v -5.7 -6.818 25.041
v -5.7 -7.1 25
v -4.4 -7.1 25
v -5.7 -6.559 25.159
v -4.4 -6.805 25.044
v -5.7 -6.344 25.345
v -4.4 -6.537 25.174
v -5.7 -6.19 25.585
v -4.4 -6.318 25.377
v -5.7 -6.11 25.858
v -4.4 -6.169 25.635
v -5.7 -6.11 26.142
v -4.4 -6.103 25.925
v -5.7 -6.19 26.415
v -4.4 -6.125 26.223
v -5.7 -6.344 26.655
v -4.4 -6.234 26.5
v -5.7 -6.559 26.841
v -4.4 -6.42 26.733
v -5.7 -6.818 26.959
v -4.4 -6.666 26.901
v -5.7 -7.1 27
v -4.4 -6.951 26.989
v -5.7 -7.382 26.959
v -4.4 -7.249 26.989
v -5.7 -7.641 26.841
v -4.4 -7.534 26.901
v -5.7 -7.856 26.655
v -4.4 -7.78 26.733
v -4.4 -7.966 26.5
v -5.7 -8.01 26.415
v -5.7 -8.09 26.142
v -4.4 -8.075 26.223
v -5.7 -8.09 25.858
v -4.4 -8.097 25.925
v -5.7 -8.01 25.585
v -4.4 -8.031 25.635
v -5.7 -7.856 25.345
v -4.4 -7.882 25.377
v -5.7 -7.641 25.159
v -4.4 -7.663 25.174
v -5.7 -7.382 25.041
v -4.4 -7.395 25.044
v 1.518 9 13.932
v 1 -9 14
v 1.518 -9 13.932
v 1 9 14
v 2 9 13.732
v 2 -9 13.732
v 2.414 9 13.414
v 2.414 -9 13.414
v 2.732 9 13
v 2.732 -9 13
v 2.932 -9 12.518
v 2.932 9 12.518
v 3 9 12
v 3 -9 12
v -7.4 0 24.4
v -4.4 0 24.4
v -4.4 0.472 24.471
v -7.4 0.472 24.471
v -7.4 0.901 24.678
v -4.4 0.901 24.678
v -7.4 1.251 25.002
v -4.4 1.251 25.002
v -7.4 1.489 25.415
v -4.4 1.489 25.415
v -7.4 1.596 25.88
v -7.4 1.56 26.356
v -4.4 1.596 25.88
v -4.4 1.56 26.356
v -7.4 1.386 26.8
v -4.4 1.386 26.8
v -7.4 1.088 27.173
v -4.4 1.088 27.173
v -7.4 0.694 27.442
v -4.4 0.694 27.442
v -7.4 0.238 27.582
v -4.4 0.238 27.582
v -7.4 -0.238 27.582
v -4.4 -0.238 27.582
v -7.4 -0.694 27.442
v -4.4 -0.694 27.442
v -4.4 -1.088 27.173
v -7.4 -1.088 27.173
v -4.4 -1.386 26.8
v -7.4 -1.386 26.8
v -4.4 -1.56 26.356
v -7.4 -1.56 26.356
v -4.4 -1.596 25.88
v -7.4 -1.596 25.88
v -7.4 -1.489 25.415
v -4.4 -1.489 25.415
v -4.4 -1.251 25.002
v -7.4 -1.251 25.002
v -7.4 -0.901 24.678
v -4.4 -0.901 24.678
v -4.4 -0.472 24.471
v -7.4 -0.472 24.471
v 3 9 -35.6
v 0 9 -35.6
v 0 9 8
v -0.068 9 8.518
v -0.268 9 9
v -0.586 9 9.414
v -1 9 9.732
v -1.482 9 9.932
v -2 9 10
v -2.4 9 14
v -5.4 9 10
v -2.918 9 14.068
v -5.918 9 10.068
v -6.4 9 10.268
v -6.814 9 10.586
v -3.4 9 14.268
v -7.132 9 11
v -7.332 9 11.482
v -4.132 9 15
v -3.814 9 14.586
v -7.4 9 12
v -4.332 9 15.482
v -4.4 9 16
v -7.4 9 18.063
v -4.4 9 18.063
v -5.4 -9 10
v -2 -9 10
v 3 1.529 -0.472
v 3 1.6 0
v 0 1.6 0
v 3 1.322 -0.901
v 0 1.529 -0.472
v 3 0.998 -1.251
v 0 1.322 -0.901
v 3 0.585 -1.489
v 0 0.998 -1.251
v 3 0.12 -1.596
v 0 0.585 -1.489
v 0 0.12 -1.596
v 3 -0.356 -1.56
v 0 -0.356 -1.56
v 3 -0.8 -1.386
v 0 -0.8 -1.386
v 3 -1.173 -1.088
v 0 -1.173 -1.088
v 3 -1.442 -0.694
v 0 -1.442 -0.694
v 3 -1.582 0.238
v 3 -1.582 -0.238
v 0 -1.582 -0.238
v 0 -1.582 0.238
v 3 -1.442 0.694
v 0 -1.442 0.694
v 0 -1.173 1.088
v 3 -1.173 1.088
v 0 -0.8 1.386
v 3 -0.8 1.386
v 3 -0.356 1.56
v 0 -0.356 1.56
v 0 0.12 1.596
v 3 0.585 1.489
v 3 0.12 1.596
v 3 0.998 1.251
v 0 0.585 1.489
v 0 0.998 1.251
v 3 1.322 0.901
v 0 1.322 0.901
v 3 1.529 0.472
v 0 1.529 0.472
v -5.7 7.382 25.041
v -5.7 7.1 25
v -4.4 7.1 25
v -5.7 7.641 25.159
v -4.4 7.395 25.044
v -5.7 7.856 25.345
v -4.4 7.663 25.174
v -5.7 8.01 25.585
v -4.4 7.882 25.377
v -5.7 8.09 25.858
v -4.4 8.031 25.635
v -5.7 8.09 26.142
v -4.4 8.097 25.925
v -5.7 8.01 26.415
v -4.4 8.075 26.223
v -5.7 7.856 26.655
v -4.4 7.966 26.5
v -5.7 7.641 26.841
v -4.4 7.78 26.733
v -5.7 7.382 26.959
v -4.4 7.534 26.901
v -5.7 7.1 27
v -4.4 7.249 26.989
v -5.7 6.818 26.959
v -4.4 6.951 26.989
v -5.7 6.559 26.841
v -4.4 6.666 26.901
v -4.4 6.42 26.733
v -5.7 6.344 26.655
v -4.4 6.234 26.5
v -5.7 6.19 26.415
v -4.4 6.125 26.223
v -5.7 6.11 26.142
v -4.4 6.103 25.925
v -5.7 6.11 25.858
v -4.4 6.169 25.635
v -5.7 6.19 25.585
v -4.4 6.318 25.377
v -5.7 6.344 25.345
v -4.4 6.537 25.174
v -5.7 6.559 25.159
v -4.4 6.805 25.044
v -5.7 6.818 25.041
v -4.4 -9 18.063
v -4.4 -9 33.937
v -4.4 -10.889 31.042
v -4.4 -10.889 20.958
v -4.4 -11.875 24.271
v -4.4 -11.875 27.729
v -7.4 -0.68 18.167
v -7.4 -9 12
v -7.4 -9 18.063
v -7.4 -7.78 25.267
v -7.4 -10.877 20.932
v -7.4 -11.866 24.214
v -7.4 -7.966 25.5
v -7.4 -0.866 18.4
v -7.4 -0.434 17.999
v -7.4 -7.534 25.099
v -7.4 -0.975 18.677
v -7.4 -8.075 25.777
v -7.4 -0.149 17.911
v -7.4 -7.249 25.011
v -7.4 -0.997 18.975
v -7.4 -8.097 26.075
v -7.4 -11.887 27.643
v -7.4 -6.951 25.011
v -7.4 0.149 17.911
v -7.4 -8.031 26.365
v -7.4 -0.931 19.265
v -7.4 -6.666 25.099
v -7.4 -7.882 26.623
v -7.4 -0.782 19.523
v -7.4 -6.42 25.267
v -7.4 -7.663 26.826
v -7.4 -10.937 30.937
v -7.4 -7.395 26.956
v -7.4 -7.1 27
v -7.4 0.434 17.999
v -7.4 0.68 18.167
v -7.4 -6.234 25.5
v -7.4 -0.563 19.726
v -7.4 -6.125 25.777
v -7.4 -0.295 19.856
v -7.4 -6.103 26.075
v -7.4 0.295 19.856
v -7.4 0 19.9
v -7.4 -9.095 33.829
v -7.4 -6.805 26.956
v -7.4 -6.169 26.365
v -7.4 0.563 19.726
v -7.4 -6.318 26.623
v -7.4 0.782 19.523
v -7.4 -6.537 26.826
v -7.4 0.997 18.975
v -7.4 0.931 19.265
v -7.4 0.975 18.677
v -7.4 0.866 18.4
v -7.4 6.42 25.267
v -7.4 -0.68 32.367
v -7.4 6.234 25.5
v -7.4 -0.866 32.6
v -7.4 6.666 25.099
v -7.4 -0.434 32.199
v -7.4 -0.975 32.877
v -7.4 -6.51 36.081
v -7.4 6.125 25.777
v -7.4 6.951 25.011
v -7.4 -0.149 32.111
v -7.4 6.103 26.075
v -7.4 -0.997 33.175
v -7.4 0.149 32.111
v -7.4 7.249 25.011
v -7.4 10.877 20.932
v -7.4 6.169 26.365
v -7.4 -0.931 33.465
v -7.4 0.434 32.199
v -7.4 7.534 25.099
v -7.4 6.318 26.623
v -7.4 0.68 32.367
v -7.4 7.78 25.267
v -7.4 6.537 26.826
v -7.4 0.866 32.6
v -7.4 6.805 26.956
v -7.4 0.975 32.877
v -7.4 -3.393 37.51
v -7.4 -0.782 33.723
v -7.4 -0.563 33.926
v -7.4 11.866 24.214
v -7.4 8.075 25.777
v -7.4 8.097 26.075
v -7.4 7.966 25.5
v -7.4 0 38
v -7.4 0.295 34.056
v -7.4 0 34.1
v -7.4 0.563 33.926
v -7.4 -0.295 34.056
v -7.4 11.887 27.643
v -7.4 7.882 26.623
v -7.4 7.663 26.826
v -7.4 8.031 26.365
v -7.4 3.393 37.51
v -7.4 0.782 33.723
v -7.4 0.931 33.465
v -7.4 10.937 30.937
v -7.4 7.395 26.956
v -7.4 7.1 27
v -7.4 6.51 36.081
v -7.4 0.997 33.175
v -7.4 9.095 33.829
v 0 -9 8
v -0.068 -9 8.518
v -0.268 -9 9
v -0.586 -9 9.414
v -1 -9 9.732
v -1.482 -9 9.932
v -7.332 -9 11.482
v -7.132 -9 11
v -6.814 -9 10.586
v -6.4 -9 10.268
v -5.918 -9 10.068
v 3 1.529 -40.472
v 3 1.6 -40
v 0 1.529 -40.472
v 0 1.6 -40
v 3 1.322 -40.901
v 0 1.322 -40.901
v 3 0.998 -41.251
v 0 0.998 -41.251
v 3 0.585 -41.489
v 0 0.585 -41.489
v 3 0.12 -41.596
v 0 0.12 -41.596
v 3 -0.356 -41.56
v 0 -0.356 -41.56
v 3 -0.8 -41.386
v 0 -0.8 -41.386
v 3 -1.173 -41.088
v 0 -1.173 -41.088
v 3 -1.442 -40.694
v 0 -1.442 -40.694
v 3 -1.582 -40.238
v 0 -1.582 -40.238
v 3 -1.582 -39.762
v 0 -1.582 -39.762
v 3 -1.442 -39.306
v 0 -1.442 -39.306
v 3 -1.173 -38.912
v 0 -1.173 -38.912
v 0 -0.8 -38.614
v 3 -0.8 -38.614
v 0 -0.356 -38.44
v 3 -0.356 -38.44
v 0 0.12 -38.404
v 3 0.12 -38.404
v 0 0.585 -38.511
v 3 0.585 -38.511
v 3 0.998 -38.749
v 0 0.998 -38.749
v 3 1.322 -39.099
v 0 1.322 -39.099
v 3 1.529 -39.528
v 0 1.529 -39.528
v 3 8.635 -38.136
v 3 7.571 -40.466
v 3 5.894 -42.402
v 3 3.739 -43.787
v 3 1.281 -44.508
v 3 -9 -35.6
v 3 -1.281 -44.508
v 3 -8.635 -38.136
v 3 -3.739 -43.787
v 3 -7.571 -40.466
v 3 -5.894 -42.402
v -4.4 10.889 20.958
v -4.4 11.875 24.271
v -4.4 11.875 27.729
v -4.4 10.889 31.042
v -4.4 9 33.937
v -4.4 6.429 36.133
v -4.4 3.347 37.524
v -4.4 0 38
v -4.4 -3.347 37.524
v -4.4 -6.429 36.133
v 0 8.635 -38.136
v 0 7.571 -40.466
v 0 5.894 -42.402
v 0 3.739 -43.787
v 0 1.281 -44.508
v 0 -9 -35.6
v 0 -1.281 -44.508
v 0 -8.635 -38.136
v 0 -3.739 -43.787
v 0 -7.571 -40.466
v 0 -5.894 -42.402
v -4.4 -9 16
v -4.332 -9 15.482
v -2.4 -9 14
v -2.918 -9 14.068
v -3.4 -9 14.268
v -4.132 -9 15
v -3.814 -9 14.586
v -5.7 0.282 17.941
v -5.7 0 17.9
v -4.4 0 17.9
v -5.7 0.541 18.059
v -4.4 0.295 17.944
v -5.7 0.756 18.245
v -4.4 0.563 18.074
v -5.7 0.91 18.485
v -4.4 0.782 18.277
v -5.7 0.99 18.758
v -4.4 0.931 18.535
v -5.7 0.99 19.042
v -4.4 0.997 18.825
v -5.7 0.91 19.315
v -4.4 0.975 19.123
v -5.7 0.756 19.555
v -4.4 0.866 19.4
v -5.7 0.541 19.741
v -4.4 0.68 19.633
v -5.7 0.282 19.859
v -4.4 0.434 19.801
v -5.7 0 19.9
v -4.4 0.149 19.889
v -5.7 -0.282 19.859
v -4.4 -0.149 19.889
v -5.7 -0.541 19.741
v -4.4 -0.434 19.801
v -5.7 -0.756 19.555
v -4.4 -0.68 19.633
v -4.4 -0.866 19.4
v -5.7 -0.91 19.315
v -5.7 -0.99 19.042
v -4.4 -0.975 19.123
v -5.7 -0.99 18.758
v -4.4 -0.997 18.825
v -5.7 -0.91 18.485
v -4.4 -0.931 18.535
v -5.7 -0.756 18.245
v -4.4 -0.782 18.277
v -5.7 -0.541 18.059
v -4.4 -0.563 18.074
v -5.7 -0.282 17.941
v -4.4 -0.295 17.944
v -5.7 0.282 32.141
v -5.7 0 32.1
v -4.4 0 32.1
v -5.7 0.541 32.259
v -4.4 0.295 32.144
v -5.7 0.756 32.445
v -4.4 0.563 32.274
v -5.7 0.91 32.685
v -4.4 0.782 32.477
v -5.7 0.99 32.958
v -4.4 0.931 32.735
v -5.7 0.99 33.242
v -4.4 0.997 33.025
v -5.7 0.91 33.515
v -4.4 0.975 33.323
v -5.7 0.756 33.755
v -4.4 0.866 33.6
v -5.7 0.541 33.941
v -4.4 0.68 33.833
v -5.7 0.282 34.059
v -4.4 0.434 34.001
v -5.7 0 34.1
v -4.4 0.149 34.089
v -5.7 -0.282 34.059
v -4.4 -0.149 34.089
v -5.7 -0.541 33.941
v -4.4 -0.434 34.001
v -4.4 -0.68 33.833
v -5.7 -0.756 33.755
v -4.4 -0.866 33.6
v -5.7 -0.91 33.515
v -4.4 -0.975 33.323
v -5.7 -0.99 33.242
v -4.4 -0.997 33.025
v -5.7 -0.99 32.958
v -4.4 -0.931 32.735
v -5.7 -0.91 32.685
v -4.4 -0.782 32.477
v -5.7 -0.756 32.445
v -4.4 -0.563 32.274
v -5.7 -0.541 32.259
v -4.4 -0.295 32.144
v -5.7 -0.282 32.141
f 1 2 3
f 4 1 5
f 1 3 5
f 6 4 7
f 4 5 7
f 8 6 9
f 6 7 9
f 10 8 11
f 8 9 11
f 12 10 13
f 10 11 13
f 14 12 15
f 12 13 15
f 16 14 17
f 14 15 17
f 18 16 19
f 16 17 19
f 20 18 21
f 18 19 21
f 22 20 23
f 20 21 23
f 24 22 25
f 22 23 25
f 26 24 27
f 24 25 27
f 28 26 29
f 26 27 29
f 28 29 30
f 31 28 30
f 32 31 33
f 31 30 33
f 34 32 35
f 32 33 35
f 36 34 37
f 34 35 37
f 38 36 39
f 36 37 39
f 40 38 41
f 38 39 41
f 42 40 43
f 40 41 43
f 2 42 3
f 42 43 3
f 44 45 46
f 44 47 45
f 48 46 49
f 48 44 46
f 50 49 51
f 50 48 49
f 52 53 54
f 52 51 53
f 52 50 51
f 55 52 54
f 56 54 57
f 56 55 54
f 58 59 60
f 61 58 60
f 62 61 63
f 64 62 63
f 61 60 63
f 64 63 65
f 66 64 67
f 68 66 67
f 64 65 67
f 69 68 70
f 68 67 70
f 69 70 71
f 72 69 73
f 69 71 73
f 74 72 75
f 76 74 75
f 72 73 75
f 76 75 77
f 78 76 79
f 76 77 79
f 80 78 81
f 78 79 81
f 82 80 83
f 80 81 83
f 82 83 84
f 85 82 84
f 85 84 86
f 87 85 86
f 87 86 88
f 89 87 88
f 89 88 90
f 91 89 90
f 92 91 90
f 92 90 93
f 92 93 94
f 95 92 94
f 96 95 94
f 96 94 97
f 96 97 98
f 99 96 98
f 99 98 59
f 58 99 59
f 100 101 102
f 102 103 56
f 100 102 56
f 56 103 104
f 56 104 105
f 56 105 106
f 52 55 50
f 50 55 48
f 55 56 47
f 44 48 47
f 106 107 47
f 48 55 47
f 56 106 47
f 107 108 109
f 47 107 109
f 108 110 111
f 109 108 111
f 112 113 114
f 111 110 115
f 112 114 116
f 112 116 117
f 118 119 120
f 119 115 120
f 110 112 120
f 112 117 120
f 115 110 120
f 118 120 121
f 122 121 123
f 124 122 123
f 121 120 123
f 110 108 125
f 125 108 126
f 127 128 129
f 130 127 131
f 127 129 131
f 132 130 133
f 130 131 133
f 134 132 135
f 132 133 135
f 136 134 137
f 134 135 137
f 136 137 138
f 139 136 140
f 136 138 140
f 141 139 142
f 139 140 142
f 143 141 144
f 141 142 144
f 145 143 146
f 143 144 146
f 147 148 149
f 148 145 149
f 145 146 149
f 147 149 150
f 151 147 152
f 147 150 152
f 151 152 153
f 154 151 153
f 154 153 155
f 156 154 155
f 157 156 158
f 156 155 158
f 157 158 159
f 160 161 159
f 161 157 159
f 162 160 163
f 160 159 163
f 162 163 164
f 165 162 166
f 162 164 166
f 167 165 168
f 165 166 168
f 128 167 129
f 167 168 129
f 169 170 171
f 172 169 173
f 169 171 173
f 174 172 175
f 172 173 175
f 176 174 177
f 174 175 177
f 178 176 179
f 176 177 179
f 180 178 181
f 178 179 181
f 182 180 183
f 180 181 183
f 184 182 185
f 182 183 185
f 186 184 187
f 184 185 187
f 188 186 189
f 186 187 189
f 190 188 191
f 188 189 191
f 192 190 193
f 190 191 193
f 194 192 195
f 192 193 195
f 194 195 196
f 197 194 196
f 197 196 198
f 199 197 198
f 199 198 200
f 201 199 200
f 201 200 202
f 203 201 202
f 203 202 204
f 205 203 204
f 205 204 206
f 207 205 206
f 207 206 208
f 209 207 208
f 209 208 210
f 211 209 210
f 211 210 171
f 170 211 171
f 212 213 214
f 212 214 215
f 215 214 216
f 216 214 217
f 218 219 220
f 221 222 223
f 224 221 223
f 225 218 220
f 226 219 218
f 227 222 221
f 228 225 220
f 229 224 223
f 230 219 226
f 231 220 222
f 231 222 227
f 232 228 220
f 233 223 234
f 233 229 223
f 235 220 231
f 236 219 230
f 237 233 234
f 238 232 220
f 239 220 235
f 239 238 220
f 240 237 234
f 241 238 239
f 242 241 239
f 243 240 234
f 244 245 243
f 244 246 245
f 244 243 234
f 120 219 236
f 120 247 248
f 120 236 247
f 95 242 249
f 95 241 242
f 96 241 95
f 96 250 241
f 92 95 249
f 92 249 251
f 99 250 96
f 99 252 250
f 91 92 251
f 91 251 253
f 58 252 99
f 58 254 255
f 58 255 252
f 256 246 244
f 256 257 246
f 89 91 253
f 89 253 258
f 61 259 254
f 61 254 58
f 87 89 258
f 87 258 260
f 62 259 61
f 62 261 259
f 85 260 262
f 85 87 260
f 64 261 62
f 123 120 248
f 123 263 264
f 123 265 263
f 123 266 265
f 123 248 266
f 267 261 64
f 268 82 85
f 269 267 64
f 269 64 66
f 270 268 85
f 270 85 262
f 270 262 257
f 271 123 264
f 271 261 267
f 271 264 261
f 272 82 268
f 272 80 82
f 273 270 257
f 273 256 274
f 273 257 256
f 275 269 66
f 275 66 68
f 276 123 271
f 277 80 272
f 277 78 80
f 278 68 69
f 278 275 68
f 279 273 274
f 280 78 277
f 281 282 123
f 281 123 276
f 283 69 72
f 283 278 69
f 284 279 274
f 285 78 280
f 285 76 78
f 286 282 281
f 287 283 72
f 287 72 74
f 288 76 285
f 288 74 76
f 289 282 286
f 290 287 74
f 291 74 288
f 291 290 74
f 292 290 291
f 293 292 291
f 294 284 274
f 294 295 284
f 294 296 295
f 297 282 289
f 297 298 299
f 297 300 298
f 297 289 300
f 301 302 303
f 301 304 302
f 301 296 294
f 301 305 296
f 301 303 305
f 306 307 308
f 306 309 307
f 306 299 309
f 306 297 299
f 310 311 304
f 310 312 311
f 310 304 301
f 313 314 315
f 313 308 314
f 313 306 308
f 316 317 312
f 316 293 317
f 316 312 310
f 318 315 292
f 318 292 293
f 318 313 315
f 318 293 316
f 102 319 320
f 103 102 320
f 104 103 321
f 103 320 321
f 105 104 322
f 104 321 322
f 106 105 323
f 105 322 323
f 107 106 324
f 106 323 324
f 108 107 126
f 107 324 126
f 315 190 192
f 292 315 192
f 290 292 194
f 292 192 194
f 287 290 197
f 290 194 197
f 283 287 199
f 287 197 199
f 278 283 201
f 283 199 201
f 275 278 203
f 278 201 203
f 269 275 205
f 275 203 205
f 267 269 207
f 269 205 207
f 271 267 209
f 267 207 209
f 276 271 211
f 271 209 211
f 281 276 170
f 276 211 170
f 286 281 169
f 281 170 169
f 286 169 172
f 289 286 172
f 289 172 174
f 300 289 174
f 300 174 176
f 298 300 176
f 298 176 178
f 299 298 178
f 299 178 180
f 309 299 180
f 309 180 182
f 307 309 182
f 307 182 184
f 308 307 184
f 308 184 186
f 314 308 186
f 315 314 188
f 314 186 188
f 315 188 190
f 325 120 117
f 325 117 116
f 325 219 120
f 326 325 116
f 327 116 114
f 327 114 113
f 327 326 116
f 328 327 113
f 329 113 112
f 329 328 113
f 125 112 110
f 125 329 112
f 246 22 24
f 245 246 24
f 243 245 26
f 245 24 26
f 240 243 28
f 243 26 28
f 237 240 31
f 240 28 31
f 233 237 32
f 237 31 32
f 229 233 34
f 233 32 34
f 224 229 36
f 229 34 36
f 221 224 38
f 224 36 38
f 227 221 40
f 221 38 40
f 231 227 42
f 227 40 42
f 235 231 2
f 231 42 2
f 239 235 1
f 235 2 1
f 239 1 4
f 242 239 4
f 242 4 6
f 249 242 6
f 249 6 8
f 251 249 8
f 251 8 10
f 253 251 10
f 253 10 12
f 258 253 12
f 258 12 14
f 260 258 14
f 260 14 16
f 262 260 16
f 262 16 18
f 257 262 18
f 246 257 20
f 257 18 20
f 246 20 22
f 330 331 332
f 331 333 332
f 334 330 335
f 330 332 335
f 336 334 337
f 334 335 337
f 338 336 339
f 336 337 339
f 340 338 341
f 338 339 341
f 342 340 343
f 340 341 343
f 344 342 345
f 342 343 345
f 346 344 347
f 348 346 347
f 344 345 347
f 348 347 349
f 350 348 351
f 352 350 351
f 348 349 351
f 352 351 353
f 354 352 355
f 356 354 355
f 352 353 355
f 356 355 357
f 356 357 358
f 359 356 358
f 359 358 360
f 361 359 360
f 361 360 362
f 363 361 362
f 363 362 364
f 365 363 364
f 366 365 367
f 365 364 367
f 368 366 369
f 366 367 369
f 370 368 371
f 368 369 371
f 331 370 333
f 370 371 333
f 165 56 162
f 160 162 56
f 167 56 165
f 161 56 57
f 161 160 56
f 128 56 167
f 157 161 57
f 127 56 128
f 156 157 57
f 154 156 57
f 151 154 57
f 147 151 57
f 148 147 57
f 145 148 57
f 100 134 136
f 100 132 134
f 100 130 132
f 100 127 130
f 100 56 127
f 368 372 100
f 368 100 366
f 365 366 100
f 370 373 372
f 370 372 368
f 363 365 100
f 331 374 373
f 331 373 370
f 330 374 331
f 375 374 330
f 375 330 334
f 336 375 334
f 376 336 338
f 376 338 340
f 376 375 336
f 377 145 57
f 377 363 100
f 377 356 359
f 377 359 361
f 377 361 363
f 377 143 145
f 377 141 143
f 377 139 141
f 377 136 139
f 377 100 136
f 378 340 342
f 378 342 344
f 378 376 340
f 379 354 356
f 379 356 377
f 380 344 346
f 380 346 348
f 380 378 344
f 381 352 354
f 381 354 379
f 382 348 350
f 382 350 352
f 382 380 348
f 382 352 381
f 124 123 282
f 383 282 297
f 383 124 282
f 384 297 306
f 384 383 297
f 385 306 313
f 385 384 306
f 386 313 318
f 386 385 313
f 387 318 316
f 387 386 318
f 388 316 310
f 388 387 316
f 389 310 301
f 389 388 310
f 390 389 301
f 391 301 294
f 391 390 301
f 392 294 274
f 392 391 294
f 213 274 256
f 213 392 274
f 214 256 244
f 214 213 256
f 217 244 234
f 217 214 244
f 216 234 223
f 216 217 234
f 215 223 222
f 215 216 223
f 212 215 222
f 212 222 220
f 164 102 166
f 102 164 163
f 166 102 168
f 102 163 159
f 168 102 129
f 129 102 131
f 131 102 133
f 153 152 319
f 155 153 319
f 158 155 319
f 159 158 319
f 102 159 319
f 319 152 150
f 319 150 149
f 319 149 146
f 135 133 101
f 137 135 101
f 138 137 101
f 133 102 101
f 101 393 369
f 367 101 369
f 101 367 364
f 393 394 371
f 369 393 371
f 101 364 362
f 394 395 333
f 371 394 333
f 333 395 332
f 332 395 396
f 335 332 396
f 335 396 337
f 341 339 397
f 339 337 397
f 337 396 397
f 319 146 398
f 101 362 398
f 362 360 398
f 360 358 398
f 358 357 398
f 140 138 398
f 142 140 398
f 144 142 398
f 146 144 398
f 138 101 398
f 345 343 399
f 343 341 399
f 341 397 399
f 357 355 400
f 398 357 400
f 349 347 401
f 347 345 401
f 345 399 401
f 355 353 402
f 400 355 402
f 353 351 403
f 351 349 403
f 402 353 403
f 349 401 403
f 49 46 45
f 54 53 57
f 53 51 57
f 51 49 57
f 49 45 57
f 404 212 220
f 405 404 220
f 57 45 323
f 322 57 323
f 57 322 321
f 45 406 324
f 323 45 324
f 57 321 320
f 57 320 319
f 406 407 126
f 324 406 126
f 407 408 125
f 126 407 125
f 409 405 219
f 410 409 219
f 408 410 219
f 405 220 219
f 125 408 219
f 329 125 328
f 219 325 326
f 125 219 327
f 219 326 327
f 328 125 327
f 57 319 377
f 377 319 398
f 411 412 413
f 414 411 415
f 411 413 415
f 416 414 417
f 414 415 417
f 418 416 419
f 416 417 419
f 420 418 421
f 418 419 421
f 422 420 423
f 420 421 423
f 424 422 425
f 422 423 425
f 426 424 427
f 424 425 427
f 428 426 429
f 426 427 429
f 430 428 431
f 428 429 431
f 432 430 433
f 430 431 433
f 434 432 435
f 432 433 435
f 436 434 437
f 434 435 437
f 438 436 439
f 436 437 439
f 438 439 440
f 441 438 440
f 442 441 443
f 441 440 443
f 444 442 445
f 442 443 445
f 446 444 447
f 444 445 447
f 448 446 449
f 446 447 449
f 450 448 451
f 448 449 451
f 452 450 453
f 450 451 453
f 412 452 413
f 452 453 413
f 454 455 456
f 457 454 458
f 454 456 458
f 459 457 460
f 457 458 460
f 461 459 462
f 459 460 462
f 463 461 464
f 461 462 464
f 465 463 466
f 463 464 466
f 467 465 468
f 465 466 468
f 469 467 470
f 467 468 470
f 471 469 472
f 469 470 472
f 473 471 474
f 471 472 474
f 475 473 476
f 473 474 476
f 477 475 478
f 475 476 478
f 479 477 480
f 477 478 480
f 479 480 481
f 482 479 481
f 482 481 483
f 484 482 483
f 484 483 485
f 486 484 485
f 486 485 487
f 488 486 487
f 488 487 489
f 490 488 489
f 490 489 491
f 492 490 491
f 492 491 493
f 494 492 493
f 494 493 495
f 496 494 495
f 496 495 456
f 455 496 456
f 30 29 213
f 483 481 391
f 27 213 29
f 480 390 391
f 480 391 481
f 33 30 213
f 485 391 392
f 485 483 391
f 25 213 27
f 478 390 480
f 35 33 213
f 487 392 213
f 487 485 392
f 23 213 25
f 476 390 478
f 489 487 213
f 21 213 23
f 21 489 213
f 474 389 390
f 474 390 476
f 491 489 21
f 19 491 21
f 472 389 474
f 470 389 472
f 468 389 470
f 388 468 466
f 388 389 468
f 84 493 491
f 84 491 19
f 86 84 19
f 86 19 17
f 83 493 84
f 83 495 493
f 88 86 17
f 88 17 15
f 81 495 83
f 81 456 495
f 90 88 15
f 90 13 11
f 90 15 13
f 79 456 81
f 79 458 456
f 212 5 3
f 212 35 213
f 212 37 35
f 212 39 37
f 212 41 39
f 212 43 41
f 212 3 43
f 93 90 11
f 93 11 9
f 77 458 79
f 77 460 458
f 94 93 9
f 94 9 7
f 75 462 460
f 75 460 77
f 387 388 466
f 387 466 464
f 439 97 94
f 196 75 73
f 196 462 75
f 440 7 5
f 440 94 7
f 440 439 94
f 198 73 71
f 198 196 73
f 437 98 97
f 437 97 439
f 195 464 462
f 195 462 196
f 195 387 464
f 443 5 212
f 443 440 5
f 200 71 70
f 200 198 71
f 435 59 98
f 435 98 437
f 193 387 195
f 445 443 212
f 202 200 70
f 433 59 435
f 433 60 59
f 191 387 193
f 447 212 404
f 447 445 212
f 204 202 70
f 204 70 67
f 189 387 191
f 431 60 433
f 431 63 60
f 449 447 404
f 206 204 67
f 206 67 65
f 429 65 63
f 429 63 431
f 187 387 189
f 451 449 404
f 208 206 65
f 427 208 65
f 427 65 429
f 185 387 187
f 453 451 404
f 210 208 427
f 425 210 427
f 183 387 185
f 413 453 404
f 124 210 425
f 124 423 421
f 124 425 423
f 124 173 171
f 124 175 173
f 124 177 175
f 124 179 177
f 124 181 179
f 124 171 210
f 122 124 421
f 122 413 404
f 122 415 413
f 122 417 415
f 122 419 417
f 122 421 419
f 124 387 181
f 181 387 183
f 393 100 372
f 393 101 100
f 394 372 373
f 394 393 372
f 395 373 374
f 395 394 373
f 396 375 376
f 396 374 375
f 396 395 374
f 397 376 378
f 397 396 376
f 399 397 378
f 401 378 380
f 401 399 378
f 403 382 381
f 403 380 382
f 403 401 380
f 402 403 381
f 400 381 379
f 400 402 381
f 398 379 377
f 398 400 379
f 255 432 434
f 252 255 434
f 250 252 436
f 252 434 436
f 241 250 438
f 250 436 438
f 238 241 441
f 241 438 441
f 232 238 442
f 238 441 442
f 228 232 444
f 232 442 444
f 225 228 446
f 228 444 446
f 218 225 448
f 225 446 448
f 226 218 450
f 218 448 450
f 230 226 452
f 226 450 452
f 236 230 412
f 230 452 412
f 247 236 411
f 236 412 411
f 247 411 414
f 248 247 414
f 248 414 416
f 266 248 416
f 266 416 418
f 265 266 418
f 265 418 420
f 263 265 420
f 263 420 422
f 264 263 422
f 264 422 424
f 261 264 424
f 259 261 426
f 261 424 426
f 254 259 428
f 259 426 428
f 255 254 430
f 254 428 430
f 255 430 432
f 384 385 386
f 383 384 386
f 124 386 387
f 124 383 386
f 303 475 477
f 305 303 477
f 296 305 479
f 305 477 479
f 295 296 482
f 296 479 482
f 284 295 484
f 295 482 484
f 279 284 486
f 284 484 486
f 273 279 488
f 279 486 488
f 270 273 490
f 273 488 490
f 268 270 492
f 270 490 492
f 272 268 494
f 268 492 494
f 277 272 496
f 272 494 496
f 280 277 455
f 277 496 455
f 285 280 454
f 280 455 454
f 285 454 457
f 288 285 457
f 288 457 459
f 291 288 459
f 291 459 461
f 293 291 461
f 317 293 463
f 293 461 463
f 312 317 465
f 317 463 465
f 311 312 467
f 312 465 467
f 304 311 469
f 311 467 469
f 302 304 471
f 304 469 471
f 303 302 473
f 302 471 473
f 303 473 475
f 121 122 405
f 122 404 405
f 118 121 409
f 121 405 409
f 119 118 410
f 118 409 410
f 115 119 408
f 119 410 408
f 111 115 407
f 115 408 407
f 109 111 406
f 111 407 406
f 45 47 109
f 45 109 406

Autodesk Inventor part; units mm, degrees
ref_plane "YZ Plane" through (0, 0, 0) normal (1, 0, 0) x (0, 1, 0)
ref_plane "XZ Plane" through (0, 0, 0) normal (0, 1, 0) x (-1, 0, 0)
ref_plane "XY Plane" through (0, 0, 0) normal (0, 0, 1) x (1, 0, 0)
sketch "Sketch1" plane through (0, 0, 0) normal (1, 0, 0) x (0, 1, 0)
  circle A0 centre (0, 0) radius 1.6
  line L0 (0, 0) -> (0, -40)
  circle A1 centre (0, -40) radius 1.6
  line L1 (0, -40) -> (0, -44.6)
  line L2 (0, -44.6) -> (0, -35.6)
  line L3 (0, 0) -> (0, 4.6)
  line L4 (0, 4.6) -> (0, -4.4)
  circle A2 centre (0, -35.6) radius 9
  line L5 (9, -4.4) -> (9, -35.6)
  line L6 (-9, -35.6) -> (-9, -4.4)
  line L7 (0, 0) -> (0, 7)
  line L8 (0, 7) -> (9, 7)
  line L9 (9, 7) -> (9, -4.4)
  line L10 (0, 7) -> (-9, 7)
  line L11 (-9, 7) -> (-9, -4.4)
  dimension "d0" = 3.2
  dimension "d1" = 40
  dimension "d2" = 3.2
  dimension "d3" = 4.6
  dimension "d4" = 9
  dimension "d5" = 4.6
  dimension "d6" = 9
  dimension "d9" = 7
extrude "Extrusion2" add sketch "Sketch1" along normal blind 3 contours A0 L3 L7 L8 L9 L5 A2 L0 | A0 L0 A2 L6 L11 L10 L7 L3 | A2 L1 A1 L0 | L0 A1 L1 A2
sketch "Sketch2" plane through (0, -9, 7) normal (0, 0, 1) x (1, 0, 0)
  line L0 (0, 18) -> (0, 0) projected
  line L1 (0, 0) -> (3, 0) projected
  line L2 (3, 18) -> (3, 0) projected
  line L3 (0, 18) -> (3, 18) projected
  point P0 (0, 9)
extrude "Extrusion3" add sketch "Sketch2" along normal blind 24.5
sketch "Sketch5" plane through (3, 0, 0) normal (1, 0, 0) x (0, 0, -1)
  line L0 (35.6, 9) -> (-31.5, 9) projected
  line L1 (-31.5, -9) -> (-31.5, 9) projected
  line L2 (35.6, -9) -> (-31.5, -9) projected
  arc A0 (35.6, -9) -> (35.6, 9) centre (35.6, 0) ccw projected
  circle A1 centre (40, 0) radius 1.6 projected
  circle A2 centre (0, 0) radius 1.6 projected
  line L3 (0, 0) -> (-10, 0)
  line L4 (-10, 0) -> (-10, 9)
  line L5 (35.6, 9) -> (-31.5, 9) projected
  line L6 (-10, 0) -> (-10, -9)
  line L7 (35.6, -9) -> (-31.5, -9) projected
  line L8 (-10, -9) -> (-14, -9)
  line L9 (-14, -9) -> (-14, 9)
  line L10 (-10, 9) -> (-14, 9)
  dimension "d18" = 10
  dimension "d19" = 4
extrude "Extrusion5" add sketch "Sketch5" along normal blind 4.3 contours L4 L6 L2 L9 L0
sketch "Sketch6" plane through (7.3, 0, 0) normal (1, 0, 0) x (0, 0, -1)
  line L0 (-14, -9) -> (-10, -9) projected
  line L1 (-10, -9) -> (-10, 9) projected
  line L2 (-10, 9) -> (-14, 9) projected
  line L3 (-14, 9) -> (-14, -9) projected
  line L4 (-14, -9) -> (-14, 9) projected
  line L5 (-14, 9) -> (-14, 0)
  line L6 (-14, 0) -> (-26, 0)
  circle A0 centre (-26, 0) radius 12
  line L7 (-14, 9) -> (-18.0627, 9)
  line L8 (-14, 9) -> (-31.5, 9) projected
  line L9 (-14, -9) -> (-18.0627, -9)
  line L10 (-14, -9) -> (-31.5, -9) projected
  point P0 (0, 0)
  dimension "d22" = 12
extrude "Extrusion6" add sketch "Sketch6" along normal blind 3
sketch "Sketch7" plane through (0, 0, 0) normal (-1, 0, 0) x (0, 0, 1)
  line L0 (10, -9) -> (10, 9) projected
  line L1 (14, 9) -> (14, -9) projected
  line L2 (-35.6, 9) -> (31.5, 9) projected
  line L3 (-35.6, 9) -> (31.5, 9) projected
  arc A0 (-35.6, 9) -> (-35.6, -9) centre (-35.6, 0) ccw projected
  line L4 (-35.6, -9) -> (31.5, -9) projected
  line L5 (31.5, 9) -> (31.5, -9) projected
  circle A1 centre (-40, 0) radius 1.6 projected
  circle A2 centre (0, 0) radius 1.6 projected
extrude "Extrusion7" add sketch "Sketch7" along normal blind 2.7 contours L0 L2 L1 L4
sketch "Sketch8" plane through (-2.7, 0, 0) normal (-1, 0, 0) x (0, 0, 1)
  line L0 (14, -9) -> (14, 9) projected
  line L1 (14, 9) -> (10, 9) projected
  line L2 (10, 9) -> (10, -9) projected
  line L3 (10, -9) -> (14, -9) projected
  line L4 (14, 9) -> (14, -9) projected
  line L5 (18.0627, -9) -> (14, -9) projected
  arc A0 (18.0627, -9) -> (18.0627, 9) centre (26, 0) ccw projected
  line L6 (14, 9) -> (18.0627, 9) projected
  point P0 (0, 0)
extrude "Extrusion8" add sketch "Sketch8" along normal blind 3
sketch "Sketch9" plane through (0, -9, 31.5) normal (0, 0, 1) x (1, 0, 0)
  line L0 (0, 18) -> (0, 0) projected
  line L1 (0, 0) -> (3, 0) projected
  line L2 (3, 0) -> (3, 18) projected
  line L3 (3, 18) -> (0, 18) projected
  point P0 (0, 9)
extrude "Extrusion9" cut sketch "Sketch9" against normal blind 17.5
sketch "Sketch10" plane through (10.3, 0, 0) normal (1, 0, 0) x (0, 0, -1)
  line L0 (-18.0627, -9) -> (-10, -9) projected
  line L1 (-10, -9) -> (-10, 9) projected
  line L2 (-10, 9) -> (-18.0627, 9) projected
  arc A0 (-18.0627, 9) -> (-18.0627, -9) centre (-26, 0) ccw projected
  circle A1 centre (-26, 0) radius 12
  line L3 (-26, 0) -> (-18.9, 0)
  line L4 (-26, 0) -> (-26, -7.1)
  circle A2 centre (-18.9, 0) radius 1
  circle A3 centre (-26, -7.1) radius 1
  circle A4 centre (-33.1, 0) radius 1
  circle A5 centre (-26, 7.1) radius 1
  point P0 (0, 0)
  dimension "d31" = 7.1
  dimension "d32" = 7.1
  dimension "d33" = 2
  dimension "d34" = 2
extrude "Extrusion10" cut sketch "Sketch10" against normal blind 17.5 contours A2 | A3 | A4 | A5
sketch "Sketch11" plane through (-5.7, 0, 0) normal (-1, 0, 0) x (0, 0, 1)
  circle A0 centre (26, -7.1) radius 1 projected
  circle A1 centre (26, 7.1) radius 1 projected
  circle A2 centre (33.1, 0) radius 1 projected
  circle A3 centre (18.9, 0) radius 1 projected
  line L0 (18.0627, 9) -> (10, 9) projected
  line L1 (10, 9) -> (10, -9) projected
  line L2 (10, -9) -> (18.0627, -9) projected
  arc A4 (18.0627, -9) -> (18.0627, 9) centre (26, 0) ccw projected
  point P0 (0, 0)
extrude "Extrusion11" add sketch "Sketch11" along normal blind 1.7
sketch "Sketch12" plane through (-2.7, 0, 0) normal (1, 0, 0) x (0, 0, -1)
  circle A0 centre (-26, -7.1) radius 1 projected
  circle A1 centre (-26, 7.1) radius 1 projected
  circle A2 centre (-33.1, 0) radius 1 projected
  circle A3 centre (-18.9, 0) radius 1 projected
  line L0 (-18.0627, -9) -> (-10, -9) projected
  line L1 (-10, -9) -> (-10, 9) projected
  line L2 (-10, 9) -> (-18.0627, 9) projected
  arc A4 (-18.0627, 9) -> (-18.0627, -9) centre (-26, 0) ccw projected
  circle A5 centre (-26, -7.1) radius 1 projected
  circle A6 centre (-26, 7.1) radius 1 projected
  circle A7 centre (-33.1, 0) radius 1 projected
  circle A8 centre (-18.9, 0) radius 1 projected
  line L3 (-14, -9) -> (-14, 9) projected
  line L4 (-18.0627, 9) -> (-14, 9) projected
  arc A9 (-18.0627, 9) -> (-18.0627, -9) centre (-26, 0) ccw projected
  line L5 (-14, -9) -> (-18.0627, -9) projected
  point P0 (0, 0)
extrude "Extrusion12" cut sketch "Sketch12" against normal blind 1.7 contours A4 L2 L3 L0
sketch "Sketch13" plane through (10.3, 0, 0) normal (1, 0, 0) x (0, 0, -1)
  circle A0 centre (-26, -7.1) radius 1 projected
  circle A1 centre (-26, 7.1) radius 1 projected
  circle A2 centre (-33.1, 0) radius 1 projected
  circle A3 centre (-18.9, 0) radius 1 projected
  line L0 (-18.0627, -9) -> (-10, -9) projected
  line L1 (-10, -9) -> (-10, 9) projected
  line L2 (-10, 9) -> (-18.0627, 9) projected
  arc A4 (-18.0627, 9) -> (-18.0627, -9) centre (-26, 0) ccw projected
  point P0 (0, 0)
extrude "Extrusion13" add sketch "Sketch13" along normal blind 1.7
sketch "Sketch14" plane through (7.3, 0, 0) normal (-1, 0, 0) x (0, 0, 1)
  line L0 (10, -9) -> (10, 9) projected
  line L1 (10, 9) -> (18.0627, 9) projected
  arc A0 (18.0627, -9) -> (18.0627, 9) centre (26, 0) ccw projected
  line L2 (18.0627, -9) -> (10, -9) projected
  circle A1 centre (18.9, 0) radius 1 projected
  circle A2 centre (33.1, 0) radius 1 projected
  circle A3 centre (26, 7.1) radius 1 projected
  circle A4 centre (26, -7.1) radius 1 projected
  circle A5 centre (26, -7.1) radius 1 projected
  circle A6 centre (26, 7.1) radius 1 projected
  circle A7 centre (33.1, 0) radius 1 projected
  circle A8 centre (18.9, 0) radius 1 projected
  line L3 (14, 9) -> (14, -9) projected
  line L4 (18.0627, -9) -> (14, -9) projected
  arc A9 (18.0627, -9) -> (18.0627, 9) centre (26, 0) ccw projected
  line L5 (14, 9) -> (18.0627, 9) projected
  point P0 (0, 0)
extrude "Extrusion14" cut sketch "Sketch14" against normal blind 1.7 contours L3 L1 A0 L2
sketch "Sketch15" plane through (12, 0, 0) normal (1, 0, 0) x (0, 0, -1)
  line L0 (-10, -9) -> (-10, 9) projected
  line L1 (-10, 9) -> (-18.0627, 9) projected
  arc A0 (-18.0627, 9) -> (-18.0627, -9) centre (-26, 0) ccw projected
  line L2 (-18.0627, -9) -> (-10, -9) projected
  circle A1 centre (-18.9, 0) radius 1 projected
  circle A2 centre (-33.1, 0) radius 1 projected
  circle A3 centre (-26, 7.1) radius 1 projected
  circle A4 centre (-26, -7.1) radius 1 projected
  point P0 (0, 0)
extrude "Extrusion15" cut sketch "Sketch15" against normal blind 9
sketch "Sketch16" plane through (-4.4, 0, 0) normal (1, 0, 0) x (0, 0, -1)
  line L0 (-18.0627, 9) -> (-14, 9) projected
  arc A0 (-18.0627, 9) -> (-18.0627, -9) centre (-26, 0) ccw projected
  line L1 (-14, -9) -> (-18.0627, -9) projected
  line L2 (-14, 9) -> (-14, -9) projected
  circle A1 centre (-18.9, 0) radius 1 projected
  circle A2 centre (-33.1, 0) radius 1 projected
  circle A3 centre (-26, 7.1) radius 1 projected
  circle A4 centre (-26, -7.1) radius 1 projected
  circle A5 centre (-26, 0) radius 1.6
  point P0 (0, 0)
  dimension "d47" = 3.2
extrude "Extrusion16" cut sketch "Sketch16" against normal blind 10 contours A5
fillet "Fillet1" radius 2 2 edges at (-4.4, 0, 14) (0, 0, 10)
fillet "Fillet2" radius 2 2 edges at (3, 0, 14) (-7.4, 0, 10)
properties part number "union_servos"
